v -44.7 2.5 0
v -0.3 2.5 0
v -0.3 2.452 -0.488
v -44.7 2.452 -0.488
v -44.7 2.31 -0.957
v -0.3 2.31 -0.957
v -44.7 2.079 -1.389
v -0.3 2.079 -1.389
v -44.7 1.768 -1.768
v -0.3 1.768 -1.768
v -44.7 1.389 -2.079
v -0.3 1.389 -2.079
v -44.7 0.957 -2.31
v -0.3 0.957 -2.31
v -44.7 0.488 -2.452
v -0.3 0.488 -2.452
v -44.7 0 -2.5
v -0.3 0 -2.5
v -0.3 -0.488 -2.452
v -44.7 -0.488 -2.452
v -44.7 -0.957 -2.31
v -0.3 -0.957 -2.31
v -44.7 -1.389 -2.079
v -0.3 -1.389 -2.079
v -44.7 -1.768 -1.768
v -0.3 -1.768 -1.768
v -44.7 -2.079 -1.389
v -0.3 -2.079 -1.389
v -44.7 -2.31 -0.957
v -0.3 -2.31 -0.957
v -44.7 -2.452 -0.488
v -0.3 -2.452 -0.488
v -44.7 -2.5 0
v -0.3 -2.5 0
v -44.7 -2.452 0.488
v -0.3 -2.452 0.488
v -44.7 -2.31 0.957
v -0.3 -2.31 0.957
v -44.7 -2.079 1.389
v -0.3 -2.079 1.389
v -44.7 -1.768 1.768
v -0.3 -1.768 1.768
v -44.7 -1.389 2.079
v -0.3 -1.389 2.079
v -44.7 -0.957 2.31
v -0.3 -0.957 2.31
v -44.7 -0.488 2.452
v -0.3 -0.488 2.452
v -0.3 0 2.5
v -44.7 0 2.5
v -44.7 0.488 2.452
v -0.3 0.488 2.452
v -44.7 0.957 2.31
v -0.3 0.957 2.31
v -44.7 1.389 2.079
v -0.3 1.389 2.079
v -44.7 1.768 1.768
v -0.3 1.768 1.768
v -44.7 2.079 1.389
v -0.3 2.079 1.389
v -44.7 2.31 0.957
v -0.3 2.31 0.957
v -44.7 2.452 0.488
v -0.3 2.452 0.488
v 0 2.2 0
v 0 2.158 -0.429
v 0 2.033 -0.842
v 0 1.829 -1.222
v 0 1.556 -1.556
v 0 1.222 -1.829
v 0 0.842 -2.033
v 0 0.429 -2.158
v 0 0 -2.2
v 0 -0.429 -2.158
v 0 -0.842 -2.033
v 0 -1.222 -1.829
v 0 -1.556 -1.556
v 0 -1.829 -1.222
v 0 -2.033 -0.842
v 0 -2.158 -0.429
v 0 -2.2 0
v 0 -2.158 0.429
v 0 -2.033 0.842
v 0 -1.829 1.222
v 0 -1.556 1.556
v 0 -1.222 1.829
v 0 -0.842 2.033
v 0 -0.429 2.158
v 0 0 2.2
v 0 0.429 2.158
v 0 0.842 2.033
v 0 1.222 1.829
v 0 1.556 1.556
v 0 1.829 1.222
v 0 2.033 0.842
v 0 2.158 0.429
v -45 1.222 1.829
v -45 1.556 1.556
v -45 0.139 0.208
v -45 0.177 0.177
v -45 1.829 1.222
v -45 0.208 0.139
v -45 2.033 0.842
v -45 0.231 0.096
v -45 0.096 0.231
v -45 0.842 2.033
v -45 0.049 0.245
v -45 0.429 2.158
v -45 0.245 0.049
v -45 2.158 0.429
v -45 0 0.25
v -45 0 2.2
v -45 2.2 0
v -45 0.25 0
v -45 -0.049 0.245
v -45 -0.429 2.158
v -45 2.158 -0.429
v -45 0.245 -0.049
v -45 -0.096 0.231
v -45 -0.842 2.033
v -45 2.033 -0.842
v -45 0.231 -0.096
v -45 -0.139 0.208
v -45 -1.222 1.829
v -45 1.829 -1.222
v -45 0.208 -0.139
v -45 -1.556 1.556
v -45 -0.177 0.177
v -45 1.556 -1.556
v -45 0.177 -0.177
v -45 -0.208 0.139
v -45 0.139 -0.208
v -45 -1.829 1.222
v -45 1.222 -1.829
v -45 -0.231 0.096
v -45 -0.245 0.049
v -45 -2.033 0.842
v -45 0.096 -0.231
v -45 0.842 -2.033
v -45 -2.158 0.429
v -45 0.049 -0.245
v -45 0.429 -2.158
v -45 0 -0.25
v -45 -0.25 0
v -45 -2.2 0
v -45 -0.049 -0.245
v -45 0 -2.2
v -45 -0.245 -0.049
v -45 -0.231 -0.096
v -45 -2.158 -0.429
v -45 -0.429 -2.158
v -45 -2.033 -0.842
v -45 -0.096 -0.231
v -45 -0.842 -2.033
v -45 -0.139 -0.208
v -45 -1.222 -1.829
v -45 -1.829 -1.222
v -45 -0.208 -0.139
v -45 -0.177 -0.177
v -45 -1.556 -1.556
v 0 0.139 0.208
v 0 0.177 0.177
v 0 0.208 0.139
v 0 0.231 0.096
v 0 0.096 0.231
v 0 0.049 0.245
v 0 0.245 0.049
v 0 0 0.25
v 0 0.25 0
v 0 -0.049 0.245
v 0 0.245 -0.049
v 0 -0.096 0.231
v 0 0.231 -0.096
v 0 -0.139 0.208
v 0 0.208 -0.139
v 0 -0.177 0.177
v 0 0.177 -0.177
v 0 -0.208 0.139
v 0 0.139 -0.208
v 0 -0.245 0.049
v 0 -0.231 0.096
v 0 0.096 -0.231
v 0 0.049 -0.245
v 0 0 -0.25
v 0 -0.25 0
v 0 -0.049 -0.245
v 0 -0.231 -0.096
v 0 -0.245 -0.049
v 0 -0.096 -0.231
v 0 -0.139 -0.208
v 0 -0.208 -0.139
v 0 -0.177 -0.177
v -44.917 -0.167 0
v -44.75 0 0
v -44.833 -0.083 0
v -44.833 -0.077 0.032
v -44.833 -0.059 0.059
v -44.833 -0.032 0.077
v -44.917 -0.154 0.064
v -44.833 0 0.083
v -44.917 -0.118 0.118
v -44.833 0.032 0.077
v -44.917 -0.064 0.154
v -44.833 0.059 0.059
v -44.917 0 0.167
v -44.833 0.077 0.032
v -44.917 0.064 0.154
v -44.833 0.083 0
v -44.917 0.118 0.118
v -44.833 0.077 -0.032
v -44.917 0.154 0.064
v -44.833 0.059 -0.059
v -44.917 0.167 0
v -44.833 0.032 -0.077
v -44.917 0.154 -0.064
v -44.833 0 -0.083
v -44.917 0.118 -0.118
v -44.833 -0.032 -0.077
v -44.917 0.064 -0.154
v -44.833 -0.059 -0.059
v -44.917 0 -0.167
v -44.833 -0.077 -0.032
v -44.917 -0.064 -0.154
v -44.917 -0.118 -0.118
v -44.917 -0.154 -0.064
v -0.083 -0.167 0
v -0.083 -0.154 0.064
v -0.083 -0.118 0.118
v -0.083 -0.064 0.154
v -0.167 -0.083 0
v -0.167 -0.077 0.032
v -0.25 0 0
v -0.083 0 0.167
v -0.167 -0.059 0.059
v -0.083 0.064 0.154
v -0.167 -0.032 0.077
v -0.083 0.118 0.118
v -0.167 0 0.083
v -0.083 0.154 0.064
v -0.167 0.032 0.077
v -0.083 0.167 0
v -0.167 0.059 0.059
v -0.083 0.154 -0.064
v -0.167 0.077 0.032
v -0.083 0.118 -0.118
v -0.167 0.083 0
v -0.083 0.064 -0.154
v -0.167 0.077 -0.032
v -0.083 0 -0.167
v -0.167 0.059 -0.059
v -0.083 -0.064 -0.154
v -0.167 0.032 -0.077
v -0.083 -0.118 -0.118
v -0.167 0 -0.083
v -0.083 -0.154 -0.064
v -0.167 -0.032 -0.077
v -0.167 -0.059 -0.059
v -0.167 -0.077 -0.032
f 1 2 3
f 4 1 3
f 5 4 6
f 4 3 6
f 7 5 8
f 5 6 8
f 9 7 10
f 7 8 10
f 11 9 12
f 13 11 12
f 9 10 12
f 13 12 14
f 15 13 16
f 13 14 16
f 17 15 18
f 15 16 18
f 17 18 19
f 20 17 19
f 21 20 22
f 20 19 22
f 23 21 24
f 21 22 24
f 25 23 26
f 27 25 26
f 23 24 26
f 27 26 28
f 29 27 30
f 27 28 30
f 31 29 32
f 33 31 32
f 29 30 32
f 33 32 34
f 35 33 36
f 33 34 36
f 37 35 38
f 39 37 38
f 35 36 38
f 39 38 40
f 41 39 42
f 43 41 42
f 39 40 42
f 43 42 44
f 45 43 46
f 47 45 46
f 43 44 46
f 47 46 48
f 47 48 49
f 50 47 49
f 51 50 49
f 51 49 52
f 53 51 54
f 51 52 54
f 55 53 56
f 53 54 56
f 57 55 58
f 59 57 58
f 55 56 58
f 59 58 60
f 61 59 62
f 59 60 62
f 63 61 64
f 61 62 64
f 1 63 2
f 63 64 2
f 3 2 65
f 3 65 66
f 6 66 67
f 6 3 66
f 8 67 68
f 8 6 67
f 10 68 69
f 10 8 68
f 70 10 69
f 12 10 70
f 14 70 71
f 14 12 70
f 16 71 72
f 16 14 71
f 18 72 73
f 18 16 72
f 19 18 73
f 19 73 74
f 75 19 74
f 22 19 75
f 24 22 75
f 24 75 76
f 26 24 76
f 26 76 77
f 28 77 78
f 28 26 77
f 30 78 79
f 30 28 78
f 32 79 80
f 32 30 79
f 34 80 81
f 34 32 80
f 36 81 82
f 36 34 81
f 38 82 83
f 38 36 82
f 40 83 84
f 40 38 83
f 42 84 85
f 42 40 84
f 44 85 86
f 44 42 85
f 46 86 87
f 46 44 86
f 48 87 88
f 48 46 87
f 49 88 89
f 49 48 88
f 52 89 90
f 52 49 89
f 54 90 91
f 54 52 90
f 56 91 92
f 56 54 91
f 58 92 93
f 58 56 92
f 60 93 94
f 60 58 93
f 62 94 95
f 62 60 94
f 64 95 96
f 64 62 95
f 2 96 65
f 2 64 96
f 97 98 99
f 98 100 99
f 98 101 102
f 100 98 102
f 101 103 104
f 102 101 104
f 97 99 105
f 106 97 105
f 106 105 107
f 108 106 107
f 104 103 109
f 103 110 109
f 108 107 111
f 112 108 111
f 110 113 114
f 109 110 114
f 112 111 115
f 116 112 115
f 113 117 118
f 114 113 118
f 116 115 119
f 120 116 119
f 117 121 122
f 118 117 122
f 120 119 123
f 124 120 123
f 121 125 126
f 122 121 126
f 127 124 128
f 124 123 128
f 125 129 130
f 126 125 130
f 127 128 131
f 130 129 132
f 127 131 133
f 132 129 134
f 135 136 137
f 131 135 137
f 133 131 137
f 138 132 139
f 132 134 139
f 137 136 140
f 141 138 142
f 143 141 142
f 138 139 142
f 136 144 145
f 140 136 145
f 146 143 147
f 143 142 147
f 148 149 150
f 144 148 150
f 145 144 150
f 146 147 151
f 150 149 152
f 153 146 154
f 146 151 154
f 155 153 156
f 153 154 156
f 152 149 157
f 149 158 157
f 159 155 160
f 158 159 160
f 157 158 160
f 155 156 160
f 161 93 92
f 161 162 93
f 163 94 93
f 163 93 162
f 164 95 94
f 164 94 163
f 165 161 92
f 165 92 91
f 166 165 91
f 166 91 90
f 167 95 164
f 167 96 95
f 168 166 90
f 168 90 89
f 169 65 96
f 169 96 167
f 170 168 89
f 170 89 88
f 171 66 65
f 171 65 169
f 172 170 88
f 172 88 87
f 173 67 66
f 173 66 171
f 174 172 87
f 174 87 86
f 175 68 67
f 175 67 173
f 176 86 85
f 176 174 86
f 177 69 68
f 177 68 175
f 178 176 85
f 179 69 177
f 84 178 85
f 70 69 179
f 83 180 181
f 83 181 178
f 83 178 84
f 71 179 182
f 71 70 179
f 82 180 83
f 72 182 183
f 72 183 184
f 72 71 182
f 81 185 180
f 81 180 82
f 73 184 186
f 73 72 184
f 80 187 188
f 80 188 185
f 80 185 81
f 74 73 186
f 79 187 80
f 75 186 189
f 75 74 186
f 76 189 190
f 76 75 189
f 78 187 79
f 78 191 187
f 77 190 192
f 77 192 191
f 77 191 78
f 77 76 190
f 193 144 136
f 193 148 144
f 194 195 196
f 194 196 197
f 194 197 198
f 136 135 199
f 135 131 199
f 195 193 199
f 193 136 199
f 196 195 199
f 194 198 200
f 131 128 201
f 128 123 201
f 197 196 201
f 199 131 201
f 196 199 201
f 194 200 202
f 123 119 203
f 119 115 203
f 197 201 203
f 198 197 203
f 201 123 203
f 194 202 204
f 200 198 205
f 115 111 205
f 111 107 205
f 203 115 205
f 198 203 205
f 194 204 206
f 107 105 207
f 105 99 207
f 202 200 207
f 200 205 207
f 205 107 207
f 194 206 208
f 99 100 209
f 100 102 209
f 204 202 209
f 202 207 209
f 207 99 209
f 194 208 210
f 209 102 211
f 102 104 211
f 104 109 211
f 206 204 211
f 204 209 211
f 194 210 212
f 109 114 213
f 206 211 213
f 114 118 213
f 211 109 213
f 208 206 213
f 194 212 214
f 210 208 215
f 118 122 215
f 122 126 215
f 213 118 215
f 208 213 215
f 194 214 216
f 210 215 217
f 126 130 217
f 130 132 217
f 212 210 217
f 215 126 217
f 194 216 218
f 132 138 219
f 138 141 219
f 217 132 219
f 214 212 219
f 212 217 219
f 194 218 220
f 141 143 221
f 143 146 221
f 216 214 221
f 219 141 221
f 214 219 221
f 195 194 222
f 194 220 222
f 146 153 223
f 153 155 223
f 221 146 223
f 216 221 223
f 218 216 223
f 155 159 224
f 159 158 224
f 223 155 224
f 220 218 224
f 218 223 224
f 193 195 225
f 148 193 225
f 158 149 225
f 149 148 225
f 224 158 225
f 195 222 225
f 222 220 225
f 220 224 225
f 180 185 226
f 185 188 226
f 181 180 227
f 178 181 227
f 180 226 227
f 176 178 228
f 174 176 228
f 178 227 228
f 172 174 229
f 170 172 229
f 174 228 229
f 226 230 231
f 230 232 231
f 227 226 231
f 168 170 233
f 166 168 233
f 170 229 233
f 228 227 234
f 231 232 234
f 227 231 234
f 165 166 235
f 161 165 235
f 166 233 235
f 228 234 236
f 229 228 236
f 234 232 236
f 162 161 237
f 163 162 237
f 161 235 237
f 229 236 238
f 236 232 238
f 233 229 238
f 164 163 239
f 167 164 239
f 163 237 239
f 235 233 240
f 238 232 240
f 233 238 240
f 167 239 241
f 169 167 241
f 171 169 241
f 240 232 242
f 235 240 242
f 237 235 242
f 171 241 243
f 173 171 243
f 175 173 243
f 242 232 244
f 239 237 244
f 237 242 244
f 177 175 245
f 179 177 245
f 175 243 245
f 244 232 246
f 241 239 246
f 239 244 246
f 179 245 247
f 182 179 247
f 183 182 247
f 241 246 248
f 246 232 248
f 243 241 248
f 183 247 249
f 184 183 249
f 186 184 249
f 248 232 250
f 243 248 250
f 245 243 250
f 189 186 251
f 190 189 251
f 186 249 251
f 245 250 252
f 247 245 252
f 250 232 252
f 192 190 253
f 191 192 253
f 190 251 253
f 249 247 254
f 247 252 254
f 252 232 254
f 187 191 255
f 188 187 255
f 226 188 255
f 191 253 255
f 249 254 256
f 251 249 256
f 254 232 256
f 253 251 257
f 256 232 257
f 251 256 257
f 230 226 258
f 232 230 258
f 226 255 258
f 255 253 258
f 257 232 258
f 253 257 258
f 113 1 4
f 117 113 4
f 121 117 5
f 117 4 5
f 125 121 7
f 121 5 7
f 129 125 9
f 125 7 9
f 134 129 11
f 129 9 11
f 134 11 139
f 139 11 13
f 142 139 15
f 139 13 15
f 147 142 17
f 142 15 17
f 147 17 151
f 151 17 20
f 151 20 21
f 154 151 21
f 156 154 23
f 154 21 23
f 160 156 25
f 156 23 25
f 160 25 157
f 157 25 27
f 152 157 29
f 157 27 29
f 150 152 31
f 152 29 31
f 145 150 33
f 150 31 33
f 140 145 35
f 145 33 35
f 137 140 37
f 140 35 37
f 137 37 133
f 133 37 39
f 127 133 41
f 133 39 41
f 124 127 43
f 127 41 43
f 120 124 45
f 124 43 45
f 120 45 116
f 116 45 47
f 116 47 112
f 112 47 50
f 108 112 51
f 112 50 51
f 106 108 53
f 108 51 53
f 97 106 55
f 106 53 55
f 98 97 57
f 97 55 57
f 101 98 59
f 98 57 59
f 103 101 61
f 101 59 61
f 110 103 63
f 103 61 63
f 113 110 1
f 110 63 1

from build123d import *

# Parameters (mm, degrees)
SKETCH1_W     = 45
SKETCH1_H     = 2.5
CHAMFER1_SIZE = 0.3


with BuildPart() as part:
    # Sketch1 → Revolve1 (revolve)
    with BuildSketch(Plane.XY):
        with Locations((-22.5, 1.25)):
            Rectangle(SKETCH1_W, SKETCH1_H)
    revolve(axis=Axis((0, 0, 0), (-1, 0, 0)))

    # Chamfer1
    chamfer1_edges = [part.edges().sort_by_distance(p)[0] for p in [
        (-45, -2.5, 0),
        (0, -2.5, 0),
    ]]
    chamfer(chamfer1_edges, length=CHAMFER1_SIZE)

    # Sketch2 → Cut-Revolve1 (revolve, cut)
    with BuildSketch(Plane.XY, mode=Mode.PRIVATE) as cut_revolve1_sk:
        Polygon((-45, 0), (-44.75, 0), (-45, 0.25), align=None)
        Polygon((0, 0), (0, 0.25), (-0.25, 0), align=None)
    revolve(cut_revolve1_sk.sketch.rotate(Axis((0, 0, 0), (-1, 0, 0)), 180), axis=Axis((0, 0, 0), (-1, 0, 0)), mode=Mode.SUBTRACT)


solid = part.part
